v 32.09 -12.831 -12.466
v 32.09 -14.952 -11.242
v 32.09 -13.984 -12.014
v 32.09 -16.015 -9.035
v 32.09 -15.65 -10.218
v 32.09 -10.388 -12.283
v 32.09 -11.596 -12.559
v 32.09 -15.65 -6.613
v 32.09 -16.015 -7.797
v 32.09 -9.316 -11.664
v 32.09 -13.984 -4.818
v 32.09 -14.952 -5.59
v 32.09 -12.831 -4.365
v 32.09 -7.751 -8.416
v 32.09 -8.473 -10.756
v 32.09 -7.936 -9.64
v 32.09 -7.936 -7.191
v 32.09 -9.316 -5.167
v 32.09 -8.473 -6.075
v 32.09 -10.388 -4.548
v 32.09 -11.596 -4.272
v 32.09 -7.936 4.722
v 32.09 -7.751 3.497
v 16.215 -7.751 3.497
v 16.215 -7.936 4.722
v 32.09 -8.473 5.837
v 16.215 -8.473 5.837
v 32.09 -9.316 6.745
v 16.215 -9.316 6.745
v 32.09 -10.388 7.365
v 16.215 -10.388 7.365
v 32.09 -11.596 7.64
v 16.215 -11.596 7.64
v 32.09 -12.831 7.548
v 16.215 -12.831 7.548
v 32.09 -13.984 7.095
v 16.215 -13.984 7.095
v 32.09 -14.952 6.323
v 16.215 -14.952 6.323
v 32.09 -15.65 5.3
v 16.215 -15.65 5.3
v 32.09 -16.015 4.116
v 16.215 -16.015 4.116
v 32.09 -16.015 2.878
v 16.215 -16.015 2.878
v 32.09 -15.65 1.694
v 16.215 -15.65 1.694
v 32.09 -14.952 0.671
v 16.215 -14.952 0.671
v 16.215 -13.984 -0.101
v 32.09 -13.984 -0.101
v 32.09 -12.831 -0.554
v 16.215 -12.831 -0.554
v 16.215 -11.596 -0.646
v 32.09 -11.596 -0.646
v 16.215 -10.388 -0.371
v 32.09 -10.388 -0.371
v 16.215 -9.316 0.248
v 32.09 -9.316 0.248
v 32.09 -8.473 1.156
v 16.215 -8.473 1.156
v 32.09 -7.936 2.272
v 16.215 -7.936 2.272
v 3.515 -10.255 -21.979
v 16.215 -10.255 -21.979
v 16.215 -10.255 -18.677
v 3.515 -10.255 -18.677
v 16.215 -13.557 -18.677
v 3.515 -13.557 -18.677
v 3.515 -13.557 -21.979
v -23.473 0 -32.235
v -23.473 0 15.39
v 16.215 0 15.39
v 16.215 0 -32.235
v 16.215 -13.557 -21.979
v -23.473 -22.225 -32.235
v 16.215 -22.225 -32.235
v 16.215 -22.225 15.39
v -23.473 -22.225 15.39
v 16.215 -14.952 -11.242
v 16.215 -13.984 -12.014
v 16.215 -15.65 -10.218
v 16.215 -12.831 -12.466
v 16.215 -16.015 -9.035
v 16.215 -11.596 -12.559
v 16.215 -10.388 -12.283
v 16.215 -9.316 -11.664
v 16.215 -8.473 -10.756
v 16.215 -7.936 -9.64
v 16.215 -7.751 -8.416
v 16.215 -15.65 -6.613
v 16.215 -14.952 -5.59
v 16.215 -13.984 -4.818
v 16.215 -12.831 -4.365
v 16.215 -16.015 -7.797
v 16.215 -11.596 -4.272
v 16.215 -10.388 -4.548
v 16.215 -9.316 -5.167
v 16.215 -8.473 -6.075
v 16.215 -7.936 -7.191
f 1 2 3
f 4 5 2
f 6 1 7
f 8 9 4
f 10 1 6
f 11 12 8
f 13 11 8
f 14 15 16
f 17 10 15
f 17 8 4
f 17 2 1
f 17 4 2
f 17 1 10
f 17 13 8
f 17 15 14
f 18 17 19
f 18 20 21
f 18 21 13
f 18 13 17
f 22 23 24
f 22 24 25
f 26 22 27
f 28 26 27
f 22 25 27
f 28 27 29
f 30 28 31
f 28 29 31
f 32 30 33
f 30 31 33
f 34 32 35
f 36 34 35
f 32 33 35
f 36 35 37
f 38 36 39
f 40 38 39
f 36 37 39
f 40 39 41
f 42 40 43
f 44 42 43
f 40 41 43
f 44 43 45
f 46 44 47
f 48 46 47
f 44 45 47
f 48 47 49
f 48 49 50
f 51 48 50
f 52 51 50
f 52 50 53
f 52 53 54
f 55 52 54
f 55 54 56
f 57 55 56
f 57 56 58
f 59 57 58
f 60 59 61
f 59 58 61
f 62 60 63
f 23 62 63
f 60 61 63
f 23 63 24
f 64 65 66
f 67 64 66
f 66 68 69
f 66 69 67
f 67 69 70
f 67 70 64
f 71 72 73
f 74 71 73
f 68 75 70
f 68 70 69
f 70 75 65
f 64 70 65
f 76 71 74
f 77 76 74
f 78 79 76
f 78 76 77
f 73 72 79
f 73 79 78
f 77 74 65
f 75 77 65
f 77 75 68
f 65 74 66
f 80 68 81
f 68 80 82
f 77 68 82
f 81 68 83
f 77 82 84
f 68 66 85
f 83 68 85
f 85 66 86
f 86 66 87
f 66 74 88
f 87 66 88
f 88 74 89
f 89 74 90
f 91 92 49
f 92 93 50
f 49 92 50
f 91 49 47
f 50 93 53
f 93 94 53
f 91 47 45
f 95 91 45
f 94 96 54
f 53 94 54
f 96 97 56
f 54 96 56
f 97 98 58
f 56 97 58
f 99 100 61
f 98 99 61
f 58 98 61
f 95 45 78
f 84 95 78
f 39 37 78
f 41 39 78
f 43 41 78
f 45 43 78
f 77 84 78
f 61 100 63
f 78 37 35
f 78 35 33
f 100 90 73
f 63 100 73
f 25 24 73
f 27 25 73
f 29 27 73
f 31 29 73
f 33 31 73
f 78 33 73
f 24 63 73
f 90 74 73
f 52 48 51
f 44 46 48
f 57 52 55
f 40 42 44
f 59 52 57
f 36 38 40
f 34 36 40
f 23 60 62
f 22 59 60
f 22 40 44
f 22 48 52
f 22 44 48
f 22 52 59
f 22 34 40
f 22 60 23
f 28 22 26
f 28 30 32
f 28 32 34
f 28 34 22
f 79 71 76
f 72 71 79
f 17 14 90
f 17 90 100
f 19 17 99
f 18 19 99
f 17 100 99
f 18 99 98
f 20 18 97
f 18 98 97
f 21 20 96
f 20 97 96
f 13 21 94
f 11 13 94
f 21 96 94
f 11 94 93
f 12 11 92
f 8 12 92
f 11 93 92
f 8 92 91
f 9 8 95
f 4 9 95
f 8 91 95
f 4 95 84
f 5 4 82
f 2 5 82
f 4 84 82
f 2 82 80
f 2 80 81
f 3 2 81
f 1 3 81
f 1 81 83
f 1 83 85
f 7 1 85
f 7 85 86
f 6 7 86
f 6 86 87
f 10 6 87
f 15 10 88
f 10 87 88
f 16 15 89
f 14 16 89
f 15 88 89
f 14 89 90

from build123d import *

# Parameters (mm, degrees)
F0_W     = 39.6875
F0_H     = 47.625
F1_DEPTH = 22.225
F2_R     = 4.1548957558
F3_DEPTH = 15.875
F2_W     = 3.302
F2_H     = 3.302
F4_DEPTH = 12.7


# Not quite as in the source:
# - a length typed as a fraction of an inch, garbled in the dataset ("3 / 203.2 mm" for 3/8 in), is restored


with BuildPart() as f1:
    # F0 (on Front) → F1 (new body)
    with BuildSketch(Plane.XZ):
        with Locations((-3.6287705289, -8.4221055731)):
            Rectangle(F0_W, F0_H)
    extrude(amount=F1_DEPTH)

    # F2 (on face) → F3 (join)
    with BuildSketch(Plane.YZ.offset(16.2149794711)):
        with Locations((-11.90625, 3.4968444269)):
            Circle(F2_R)
        with Locations((-11.90625, -8.4157555731)):
            Circle(F2_R)
    extrude(amount=F3_DEPTH)

    # F2 (on face) → F4 (cut)
    with BuildSketch(Plane.YZ.offset(16.2149794711)):
        with Locations((-11.90625, -20.3283555731)):
            Rectangle(F2_W, F2_H)
    extrude(amount=-F4_DEPTH, mode=Mode.SUBTRACT)


solid = f1.part
